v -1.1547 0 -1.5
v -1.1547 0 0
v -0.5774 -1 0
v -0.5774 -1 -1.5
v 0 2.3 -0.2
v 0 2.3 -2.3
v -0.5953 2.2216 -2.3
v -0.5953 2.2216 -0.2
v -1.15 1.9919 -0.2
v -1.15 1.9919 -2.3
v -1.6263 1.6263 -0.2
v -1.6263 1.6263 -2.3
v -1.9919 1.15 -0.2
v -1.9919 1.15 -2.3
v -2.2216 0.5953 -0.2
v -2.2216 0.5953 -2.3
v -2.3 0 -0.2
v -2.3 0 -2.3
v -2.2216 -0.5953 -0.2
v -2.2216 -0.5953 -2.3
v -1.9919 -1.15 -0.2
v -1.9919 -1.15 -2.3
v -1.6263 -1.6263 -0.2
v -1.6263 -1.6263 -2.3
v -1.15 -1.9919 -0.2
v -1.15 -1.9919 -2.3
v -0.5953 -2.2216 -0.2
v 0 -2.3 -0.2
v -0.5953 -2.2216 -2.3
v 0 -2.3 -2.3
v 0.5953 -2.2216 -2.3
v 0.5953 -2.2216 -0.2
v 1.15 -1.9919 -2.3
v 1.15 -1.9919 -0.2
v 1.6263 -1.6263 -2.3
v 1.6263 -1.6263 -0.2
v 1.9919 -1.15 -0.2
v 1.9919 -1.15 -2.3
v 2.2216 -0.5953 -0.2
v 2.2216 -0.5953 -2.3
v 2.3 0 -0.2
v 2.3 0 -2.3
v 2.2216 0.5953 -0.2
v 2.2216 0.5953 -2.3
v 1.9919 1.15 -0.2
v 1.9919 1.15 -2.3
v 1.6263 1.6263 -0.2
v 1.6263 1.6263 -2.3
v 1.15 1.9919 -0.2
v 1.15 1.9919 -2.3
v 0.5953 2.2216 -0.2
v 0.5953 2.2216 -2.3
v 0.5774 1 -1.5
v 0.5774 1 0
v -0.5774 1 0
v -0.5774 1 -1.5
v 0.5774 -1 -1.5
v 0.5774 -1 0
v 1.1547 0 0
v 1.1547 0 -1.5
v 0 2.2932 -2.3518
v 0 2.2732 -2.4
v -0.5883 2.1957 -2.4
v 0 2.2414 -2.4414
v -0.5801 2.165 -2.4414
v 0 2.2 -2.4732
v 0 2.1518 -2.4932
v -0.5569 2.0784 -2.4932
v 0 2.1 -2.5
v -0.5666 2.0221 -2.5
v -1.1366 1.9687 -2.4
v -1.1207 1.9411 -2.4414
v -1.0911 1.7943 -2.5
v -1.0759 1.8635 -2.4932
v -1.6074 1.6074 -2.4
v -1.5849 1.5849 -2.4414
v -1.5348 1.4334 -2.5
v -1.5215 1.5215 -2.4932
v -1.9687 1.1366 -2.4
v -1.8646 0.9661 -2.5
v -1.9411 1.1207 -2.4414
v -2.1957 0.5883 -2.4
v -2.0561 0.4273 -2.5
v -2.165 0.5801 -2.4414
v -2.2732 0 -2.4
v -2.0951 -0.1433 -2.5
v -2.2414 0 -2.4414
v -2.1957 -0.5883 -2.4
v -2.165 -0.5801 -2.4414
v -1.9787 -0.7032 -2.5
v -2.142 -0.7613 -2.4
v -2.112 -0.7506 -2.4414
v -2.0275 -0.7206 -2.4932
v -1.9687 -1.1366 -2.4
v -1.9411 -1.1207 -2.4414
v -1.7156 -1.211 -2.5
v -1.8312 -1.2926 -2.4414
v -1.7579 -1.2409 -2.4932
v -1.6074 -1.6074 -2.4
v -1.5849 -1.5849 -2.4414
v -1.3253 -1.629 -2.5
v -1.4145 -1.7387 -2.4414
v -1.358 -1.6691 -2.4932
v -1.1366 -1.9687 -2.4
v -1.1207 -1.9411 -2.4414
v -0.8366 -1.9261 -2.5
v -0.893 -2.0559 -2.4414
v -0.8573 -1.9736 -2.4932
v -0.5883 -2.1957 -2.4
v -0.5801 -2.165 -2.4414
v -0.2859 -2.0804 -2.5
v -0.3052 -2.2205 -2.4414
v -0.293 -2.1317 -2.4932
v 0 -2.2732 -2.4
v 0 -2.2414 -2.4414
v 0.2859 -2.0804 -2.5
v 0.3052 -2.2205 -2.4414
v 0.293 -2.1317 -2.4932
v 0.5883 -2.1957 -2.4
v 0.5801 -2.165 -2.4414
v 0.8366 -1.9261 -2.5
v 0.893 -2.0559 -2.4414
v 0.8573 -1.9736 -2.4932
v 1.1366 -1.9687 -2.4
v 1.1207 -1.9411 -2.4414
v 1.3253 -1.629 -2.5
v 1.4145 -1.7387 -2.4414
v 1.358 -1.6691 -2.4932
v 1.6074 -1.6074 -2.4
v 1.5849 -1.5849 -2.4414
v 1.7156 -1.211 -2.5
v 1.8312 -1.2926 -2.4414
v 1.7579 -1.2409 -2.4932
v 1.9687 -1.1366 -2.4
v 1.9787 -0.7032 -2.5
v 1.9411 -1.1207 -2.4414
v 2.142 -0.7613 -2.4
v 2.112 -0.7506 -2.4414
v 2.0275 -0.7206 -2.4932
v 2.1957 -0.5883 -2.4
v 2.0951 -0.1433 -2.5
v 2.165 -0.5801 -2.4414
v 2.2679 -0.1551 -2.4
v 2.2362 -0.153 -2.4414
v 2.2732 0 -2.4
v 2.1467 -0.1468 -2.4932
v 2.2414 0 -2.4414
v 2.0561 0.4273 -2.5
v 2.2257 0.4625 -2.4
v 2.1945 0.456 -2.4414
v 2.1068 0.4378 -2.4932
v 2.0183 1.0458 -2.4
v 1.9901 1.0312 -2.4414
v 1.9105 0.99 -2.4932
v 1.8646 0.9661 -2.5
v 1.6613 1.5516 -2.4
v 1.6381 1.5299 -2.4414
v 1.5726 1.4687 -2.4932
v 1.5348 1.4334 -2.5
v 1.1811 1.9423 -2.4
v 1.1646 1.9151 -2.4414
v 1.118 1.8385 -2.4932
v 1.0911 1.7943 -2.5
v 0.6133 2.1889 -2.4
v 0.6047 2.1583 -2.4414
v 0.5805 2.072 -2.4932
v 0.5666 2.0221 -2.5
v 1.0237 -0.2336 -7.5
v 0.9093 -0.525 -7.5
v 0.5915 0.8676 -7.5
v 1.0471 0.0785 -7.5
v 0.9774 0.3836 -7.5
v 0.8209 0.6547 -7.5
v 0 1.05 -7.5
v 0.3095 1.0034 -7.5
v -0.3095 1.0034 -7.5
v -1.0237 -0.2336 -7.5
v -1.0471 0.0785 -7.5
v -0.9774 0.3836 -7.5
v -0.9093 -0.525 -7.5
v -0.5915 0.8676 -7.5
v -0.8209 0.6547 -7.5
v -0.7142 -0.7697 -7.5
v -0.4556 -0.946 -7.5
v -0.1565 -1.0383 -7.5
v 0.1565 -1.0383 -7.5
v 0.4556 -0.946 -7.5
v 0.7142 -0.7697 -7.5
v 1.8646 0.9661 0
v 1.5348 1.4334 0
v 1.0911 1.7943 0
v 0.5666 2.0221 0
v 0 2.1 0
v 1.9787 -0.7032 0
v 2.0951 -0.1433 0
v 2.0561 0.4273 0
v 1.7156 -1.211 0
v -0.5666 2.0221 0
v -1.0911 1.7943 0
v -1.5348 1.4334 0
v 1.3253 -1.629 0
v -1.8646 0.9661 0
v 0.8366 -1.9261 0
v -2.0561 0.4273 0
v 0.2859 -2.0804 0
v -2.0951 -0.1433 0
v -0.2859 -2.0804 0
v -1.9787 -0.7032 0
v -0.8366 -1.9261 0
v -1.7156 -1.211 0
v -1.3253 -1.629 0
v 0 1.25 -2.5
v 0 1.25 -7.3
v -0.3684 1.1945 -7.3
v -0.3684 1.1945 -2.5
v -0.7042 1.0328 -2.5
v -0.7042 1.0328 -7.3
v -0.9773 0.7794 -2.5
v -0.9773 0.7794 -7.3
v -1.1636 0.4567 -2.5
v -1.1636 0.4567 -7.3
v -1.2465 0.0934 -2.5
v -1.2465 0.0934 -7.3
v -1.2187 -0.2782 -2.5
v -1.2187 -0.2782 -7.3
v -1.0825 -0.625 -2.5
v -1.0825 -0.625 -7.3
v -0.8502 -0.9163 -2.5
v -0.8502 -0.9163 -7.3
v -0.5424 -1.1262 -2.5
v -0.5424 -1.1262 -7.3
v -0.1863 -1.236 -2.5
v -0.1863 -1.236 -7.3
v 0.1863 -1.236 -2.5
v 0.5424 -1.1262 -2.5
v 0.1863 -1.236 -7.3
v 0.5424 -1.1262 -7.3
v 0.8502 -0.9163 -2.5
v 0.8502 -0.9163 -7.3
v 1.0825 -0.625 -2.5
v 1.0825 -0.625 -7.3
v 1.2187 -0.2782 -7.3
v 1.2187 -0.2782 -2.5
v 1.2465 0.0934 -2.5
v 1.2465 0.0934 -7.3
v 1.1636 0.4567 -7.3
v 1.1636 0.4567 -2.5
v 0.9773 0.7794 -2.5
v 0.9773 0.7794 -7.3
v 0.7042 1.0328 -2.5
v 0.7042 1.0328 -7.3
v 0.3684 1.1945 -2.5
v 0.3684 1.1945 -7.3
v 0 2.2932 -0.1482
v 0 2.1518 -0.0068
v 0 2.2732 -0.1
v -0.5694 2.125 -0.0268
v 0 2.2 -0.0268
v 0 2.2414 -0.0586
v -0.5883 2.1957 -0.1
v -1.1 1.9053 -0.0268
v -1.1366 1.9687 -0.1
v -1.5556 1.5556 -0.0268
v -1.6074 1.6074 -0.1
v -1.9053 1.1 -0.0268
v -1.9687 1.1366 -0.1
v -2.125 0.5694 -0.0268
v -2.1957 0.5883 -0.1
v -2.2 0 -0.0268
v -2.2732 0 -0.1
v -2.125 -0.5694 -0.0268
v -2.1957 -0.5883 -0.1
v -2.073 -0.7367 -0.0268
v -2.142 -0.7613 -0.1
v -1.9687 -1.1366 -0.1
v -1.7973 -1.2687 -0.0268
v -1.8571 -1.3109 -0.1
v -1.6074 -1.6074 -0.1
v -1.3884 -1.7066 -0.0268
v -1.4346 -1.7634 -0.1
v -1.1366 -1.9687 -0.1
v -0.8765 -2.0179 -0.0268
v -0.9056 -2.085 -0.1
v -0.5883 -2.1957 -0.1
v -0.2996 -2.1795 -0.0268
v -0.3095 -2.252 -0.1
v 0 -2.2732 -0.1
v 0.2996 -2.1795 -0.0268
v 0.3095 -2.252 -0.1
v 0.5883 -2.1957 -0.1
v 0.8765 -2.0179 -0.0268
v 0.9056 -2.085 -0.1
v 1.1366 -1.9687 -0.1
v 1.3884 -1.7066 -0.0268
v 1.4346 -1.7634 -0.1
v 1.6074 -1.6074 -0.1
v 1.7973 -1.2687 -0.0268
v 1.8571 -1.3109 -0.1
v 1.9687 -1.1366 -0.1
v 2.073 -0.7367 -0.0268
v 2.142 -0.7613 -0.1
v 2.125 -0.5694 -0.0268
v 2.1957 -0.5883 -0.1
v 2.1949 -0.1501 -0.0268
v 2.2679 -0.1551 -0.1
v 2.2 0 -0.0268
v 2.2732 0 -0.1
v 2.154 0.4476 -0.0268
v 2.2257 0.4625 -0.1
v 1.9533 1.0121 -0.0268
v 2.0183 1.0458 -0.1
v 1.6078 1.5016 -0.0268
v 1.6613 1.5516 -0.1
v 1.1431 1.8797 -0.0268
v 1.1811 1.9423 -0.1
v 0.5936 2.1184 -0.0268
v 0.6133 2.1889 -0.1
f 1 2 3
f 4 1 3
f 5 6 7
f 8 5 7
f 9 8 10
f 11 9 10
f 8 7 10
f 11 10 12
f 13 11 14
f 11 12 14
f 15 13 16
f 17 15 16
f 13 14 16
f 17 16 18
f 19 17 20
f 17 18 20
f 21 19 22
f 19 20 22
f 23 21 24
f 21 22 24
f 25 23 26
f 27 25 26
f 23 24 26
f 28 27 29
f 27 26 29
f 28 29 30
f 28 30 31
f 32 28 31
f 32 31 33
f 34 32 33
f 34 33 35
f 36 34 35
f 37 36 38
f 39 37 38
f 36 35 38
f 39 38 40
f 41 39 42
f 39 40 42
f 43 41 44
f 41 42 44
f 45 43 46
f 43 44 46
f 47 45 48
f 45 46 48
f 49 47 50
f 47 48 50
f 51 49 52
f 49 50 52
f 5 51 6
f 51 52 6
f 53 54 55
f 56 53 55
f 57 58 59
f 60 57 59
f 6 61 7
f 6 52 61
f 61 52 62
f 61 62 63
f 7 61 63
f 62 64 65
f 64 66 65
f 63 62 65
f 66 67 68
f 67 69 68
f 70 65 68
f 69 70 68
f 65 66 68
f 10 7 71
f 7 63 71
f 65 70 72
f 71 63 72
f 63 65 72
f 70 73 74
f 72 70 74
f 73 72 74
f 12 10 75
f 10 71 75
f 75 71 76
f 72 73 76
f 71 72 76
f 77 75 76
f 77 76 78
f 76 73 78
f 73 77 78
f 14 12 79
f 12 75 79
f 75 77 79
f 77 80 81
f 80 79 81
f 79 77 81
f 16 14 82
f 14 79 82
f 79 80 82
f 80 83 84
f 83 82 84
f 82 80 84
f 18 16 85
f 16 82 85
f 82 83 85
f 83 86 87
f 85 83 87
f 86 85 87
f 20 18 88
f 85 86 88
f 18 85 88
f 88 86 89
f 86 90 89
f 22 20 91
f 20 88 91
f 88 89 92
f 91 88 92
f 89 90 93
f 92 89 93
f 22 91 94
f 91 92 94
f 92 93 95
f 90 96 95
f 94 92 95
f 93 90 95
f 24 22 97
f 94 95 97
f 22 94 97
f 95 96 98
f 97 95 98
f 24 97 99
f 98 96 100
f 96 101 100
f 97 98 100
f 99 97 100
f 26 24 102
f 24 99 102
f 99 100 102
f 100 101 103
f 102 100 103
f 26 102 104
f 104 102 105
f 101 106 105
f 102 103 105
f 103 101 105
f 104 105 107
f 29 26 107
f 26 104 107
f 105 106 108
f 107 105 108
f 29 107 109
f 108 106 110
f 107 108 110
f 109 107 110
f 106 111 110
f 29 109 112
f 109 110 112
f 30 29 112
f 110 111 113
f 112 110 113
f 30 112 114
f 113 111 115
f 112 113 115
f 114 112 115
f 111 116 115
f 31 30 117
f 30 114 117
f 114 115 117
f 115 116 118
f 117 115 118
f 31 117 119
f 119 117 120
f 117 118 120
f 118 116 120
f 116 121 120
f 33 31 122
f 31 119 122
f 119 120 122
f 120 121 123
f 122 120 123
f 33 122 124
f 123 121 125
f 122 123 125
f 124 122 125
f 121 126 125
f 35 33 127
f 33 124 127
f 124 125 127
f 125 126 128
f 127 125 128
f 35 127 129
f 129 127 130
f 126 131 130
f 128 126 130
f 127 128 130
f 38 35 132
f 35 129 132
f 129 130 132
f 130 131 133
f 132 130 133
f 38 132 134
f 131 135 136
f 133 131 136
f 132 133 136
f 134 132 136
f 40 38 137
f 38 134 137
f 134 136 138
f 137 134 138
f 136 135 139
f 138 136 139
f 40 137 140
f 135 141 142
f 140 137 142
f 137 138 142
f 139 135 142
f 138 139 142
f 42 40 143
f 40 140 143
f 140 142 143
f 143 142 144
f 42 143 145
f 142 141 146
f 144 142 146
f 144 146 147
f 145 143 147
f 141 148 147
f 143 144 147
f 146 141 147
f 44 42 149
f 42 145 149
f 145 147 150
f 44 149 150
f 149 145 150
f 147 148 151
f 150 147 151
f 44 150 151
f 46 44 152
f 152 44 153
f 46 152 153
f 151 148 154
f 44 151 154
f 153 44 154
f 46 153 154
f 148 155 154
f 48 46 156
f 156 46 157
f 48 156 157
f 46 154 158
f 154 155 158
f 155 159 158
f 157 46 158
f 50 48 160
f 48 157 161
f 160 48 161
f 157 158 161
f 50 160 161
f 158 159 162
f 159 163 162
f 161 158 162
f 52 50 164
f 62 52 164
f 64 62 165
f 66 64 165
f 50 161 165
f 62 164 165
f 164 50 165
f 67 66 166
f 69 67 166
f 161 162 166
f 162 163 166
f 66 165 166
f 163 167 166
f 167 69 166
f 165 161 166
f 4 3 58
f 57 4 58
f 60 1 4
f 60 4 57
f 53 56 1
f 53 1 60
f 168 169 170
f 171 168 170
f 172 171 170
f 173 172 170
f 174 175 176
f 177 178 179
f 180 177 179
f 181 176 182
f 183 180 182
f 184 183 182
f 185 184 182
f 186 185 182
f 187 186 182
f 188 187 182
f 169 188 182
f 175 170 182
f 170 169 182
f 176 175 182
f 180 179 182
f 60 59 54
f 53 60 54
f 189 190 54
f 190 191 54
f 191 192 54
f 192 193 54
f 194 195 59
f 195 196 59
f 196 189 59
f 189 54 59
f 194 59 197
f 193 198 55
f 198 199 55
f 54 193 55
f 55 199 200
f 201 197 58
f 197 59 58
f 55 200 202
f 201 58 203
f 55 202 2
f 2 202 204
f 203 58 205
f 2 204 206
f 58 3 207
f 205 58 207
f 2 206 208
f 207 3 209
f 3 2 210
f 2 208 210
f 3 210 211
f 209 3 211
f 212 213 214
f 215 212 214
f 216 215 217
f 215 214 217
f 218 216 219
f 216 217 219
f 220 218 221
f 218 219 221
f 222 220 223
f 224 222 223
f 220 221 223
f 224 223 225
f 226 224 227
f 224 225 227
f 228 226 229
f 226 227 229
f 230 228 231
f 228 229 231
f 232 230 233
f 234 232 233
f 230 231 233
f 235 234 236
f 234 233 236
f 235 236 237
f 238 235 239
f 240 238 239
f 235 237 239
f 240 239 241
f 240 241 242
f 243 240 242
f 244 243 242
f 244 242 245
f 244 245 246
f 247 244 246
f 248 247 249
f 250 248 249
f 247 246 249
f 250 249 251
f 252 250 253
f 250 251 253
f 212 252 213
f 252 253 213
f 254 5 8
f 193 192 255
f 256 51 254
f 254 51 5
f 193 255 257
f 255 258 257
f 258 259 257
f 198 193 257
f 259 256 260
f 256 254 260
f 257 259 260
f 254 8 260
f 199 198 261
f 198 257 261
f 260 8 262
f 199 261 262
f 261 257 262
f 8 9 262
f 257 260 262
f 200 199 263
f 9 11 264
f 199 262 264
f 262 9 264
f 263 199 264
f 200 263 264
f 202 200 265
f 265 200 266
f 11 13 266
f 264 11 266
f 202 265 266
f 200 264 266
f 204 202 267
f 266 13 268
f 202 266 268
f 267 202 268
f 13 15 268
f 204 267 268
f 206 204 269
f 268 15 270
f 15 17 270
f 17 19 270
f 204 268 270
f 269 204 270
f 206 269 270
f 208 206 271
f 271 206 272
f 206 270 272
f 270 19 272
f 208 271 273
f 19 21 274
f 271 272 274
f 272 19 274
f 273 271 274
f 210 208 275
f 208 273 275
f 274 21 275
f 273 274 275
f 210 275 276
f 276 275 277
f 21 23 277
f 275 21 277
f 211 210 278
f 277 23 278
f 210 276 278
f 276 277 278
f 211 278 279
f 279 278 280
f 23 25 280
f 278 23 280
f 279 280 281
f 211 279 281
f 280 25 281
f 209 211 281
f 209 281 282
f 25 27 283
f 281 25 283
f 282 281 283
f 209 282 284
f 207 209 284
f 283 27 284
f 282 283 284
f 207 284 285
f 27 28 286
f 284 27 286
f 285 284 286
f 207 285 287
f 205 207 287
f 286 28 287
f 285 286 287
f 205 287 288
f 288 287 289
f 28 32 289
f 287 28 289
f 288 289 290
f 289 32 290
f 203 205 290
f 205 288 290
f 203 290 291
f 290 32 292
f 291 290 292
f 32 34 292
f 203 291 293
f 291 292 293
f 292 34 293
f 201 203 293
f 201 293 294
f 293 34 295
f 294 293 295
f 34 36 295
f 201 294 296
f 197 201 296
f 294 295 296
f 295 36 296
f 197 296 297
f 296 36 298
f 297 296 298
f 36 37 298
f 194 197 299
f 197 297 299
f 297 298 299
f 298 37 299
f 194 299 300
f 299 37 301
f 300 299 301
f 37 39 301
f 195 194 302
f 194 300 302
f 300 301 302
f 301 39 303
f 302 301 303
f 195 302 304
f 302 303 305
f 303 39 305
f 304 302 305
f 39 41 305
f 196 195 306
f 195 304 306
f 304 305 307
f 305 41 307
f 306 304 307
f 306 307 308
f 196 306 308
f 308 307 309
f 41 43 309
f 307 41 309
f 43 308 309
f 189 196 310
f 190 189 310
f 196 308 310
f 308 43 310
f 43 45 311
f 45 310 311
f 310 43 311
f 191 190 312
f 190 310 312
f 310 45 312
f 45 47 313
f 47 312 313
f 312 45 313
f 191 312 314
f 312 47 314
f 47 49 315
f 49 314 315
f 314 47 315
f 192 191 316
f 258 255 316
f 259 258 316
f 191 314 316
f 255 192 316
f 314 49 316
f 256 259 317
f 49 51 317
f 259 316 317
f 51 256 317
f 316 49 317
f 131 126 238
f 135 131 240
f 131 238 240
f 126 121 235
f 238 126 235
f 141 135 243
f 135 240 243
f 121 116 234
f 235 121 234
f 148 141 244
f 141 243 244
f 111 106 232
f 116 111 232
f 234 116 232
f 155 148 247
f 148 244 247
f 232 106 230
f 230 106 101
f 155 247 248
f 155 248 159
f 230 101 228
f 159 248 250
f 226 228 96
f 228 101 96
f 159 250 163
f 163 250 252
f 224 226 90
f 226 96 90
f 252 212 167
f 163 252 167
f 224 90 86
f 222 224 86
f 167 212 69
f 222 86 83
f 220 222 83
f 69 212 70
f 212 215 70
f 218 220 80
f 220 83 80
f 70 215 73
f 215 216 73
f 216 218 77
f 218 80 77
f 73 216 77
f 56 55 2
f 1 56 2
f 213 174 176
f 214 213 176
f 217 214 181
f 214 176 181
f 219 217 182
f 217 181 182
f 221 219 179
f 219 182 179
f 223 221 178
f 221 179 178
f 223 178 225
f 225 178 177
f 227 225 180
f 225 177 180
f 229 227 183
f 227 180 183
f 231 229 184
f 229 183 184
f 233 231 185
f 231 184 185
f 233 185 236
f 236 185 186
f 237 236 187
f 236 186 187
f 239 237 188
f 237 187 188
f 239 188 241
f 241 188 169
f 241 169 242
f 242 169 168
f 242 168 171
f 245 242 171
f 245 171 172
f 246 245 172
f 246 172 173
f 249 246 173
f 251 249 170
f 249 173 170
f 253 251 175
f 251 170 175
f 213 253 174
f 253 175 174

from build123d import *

# Parameters (mm, degrees)
FILLET_1_R          = 0.2
CHAMFER_1_SIZE      = 0.2
CUT_EXTRUDE_1_DEPTH = 1.5


with BuildPart() as part:
    # 草图2 → 旋转1 (revolve)
    with BuildSketch(Plane(origin=(0, 0, 0), x_dir=(0, 0, -1), z_dir=(1, 0, 0))):
        Polygon((0, 0), (0, 2.3), (2.5, 2.3), (2.5, 1.25), (7.5, 1.25), (7.5, 0), align=None)
    revolve(axis=Axis((0, 0, -7.5), (0, 0, 1)))

    # 圆角1
    fillet_1_edges = [part.edges().sort_by_distance(p)[0] for p in [
        (0, -2.3, -2.5),
        (0, -2.3, 0),
    ]]
    fillet(fillet_1_edges, radius=FILLET_1_R)

    # 倒角1
    chamfer_1_edges = [part.edges().sort_by_distance(p)[0] for p in [
        (0, -1.25, -7.5),
    ]]
    chamfer(chamfer_1_edges, length=CHAMFER_1_SIZE)

    # 草图3 → 切除-拉伸1 (cut)
    with BuildSketch(Plane.XY):
        Polygon((1.154700538, 0), (0.577350269, 1), (-0.577350269, 1), (-1.154700538, 0), (-0.577350269, -1), (0.577350269, -1), align=None)
    extrude(amount=-CUT_EXTRUDE_1_DEPTH, mode=Mode.SUBTRACT)


solid = part.part
